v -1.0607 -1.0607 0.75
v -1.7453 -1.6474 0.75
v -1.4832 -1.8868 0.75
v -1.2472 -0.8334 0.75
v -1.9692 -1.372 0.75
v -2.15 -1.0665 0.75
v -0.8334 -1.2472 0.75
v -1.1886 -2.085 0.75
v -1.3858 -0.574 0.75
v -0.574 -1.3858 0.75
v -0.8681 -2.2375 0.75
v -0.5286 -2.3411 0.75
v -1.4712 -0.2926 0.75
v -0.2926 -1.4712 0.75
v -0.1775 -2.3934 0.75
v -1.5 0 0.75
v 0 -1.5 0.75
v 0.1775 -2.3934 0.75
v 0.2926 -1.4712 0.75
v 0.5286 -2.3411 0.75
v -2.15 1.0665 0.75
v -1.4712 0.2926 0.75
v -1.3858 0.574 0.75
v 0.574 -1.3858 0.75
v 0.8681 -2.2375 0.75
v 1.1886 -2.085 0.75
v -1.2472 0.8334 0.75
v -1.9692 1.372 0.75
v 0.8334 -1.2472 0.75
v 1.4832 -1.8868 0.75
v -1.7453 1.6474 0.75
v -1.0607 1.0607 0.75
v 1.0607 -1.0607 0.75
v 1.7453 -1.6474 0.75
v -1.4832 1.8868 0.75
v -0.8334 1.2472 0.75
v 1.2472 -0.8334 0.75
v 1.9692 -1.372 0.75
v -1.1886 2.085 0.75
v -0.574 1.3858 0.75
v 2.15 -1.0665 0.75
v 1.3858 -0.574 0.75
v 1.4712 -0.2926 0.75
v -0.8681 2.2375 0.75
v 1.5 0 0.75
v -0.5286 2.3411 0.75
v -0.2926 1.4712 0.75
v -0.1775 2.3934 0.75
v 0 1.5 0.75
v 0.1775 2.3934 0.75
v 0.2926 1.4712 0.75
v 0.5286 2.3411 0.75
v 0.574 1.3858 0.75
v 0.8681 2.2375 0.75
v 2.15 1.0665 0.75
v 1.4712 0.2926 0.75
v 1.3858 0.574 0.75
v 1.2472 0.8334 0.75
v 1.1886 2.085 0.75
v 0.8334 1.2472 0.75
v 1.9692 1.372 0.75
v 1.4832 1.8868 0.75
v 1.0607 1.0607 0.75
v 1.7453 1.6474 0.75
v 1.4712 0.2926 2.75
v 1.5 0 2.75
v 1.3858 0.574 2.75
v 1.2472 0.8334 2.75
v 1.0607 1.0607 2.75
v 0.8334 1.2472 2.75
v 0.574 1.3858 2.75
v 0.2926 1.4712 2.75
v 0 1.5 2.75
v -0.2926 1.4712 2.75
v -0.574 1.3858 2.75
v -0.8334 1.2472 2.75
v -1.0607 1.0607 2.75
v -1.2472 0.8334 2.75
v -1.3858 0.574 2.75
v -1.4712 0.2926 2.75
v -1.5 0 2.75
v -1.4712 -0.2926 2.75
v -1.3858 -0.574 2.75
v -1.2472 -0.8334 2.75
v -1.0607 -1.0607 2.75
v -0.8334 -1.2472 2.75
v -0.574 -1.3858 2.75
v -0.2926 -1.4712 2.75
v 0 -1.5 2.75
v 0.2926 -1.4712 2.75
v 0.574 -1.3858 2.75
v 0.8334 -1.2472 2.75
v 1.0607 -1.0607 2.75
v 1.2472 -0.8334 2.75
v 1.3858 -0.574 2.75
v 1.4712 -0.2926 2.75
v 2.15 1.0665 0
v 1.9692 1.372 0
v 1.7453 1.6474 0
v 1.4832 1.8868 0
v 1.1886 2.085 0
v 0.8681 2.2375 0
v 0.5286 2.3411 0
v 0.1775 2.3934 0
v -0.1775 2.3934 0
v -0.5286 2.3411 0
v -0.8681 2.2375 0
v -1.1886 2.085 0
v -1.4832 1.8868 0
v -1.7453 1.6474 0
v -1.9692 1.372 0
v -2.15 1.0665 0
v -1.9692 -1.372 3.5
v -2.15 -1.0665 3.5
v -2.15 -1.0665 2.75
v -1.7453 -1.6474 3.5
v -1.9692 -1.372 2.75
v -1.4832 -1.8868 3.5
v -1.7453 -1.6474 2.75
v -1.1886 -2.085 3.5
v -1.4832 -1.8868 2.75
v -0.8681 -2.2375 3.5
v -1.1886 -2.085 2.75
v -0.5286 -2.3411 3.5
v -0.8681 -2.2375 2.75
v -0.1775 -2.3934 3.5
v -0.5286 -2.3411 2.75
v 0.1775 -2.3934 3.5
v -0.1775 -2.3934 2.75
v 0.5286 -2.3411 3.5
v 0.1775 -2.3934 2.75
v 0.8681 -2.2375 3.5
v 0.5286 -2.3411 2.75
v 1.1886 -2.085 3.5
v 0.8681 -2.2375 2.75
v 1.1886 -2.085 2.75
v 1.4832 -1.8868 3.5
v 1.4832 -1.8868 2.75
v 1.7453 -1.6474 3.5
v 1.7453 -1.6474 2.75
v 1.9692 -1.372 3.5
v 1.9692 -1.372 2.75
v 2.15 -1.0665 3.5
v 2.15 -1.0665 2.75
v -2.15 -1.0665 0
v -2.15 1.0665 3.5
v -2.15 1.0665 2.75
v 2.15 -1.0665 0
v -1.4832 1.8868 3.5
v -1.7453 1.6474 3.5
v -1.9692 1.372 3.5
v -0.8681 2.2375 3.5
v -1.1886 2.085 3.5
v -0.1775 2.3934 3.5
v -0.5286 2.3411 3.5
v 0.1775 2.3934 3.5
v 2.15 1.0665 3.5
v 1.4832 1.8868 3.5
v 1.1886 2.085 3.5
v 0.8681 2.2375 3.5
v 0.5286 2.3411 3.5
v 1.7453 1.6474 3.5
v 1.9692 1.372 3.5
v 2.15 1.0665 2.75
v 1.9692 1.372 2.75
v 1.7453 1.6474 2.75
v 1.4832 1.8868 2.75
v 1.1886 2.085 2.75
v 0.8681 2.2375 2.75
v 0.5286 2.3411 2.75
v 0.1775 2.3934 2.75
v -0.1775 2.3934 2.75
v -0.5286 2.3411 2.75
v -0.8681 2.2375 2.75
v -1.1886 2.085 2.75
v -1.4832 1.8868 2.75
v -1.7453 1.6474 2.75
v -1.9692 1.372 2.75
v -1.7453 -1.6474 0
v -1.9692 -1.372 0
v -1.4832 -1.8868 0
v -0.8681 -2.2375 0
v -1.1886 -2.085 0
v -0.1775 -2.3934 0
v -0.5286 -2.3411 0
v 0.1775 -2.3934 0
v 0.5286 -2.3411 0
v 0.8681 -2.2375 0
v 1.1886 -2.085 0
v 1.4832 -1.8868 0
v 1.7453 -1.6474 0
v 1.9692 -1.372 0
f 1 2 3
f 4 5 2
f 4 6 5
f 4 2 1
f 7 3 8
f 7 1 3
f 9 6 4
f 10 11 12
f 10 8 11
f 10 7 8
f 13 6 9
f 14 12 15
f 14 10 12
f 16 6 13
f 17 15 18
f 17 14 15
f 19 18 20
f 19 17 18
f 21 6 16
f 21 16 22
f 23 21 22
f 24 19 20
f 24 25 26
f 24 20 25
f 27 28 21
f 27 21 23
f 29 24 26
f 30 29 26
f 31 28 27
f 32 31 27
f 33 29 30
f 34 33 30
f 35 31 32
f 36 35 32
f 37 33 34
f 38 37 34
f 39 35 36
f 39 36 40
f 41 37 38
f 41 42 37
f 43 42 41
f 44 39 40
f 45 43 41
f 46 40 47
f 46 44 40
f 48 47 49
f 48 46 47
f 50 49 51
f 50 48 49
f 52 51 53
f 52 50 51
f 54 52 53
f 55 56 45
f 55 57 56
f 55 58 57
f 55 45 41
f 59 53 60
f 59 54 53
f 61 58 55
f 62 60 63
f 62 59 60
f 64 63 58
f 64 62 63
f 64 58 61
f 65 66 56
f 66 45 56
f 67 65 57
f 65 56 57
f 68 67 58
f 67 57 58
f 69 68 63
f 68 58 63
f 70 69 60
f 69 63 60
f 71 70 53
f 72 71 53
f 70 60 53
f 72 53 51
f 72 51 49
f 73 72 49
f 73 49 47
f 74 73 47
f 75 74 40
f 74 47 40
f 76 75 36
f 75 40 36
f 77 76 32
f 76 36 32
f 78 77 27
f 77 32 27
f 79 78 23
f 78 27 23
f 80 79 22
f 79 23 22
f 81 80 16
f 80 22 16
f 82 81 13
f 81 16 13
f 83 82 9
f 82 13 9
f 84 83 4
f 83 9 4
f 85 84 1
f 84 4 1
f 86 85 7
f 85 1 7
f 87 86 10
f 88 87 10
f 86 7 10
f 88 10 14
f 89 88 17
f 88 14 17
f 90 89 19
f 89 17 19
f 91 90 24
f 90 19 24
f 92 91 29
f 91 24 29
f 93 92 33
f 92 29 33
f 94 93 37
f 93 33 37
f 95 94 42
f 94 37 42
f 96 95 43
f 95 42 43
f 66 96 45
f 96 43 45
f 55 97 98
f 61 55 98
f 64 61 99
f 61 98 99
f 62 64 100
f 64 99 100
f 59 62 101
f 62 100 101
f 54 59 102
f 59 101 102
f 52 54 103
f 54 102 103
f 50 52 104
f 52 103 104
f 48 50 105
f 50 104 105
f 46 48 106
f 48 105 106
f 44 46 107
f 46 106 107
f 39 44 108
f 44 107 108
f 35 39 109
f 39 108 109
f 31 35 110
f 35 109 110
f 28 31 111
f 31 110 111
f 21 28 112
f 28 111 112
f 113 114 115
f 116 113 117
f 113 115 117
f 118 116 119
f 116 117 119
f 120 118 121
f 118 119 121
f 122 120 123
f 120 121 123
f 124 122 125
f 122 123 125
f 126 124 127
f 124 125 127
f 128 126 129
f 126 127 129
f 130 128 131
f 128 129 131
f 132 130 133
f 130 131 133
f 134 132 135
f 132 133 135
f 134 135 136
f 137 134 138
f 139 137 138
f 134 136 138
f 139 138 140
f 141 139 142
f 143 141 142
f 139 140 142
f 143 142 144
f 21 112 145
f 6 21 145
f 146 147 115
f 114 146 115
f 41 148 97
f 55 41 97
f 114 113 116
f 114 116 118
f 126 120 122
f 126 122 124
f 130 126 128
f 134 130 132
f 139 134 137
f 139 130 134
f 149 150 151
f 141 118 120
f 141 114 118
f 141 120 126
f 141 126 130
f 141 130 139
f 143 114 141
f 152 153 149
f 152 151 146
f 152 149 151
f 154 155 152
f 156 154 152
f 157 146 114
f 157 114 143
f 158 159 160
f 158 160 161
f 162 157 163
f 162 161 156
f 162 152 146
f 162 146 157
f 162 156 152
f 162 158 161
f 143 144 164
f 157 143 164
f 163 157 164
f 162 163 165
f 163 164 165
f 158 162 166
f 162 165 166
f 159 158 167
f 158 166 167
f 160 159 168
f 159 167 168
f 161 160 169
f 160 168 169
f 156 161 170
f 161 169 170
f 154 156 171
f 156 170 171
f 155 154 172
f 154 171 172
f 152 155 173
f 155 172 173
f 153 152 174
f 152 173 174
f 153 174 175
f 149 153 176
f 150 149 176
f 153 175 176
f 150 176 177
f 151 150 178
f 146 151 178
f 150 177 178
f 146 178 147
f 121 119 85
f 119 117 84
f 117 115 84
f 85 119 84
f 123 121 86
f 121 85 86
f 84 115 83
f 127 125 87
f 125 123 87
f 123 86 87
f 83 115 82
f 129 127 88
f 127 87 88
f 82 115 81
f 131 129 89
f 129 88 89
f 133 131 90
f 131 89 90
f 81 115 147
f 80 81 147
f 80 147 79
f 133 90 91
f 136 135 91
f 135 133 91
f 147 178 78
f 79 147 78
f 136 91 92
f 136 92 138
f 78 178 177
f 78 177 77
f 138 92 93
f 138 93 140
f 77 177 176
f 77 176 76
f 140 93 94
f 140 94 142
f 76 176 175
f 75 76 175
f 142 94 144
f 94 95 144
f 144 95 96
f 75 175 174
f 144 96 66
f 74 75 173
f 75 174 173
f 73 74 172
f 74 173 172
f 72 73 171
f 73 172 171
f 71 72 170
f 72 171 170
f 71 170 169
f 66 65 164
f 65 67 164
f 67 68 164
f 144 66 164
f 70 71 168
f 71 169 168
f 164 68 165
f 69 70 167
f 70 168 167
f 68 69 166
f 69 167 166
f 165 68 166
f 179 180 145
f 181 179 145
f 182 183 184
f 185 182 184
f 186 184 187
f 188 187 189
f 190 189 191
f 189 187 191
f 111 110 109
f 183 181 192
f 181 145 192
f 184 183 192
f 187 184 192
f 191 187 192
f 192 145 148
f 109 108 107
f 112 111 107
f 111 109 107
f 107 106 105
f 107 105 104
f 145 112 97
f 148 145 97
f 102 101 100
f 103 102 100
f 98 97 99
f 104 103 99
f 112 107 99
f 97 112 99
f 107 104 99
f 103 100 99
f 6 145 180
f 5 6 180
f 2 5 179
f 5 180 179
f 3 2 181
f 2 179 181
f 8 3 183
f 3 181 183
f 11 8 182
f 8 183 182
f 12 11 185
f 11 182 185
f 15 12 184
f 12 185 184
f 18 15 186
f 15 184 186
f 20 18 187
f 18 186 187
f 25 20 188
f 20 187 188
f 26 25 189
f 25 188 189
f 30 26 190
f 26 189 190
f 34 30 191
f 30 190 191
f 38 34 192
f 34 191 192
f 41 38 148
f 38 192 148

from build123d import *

# Parameters (mm, degrees)
PAD_DEPTH     = 3.5
SKETCH001_R   = 2.75
SKETCH001_R_2 = 1.5
POCKET_DEPTH  = 1


with BuildPart() as part:
    # Sketch → Pad (new body)
    with BuildSketch(Plane.XY):
        with BuildLine():
            ThreePointArc((2.15, 1.066536), (0, 2.4), (-2.15, 1.066536))
            Line((-2.15, 1.066536), (-2.15, -1.066536))
            ThreePointArc((-2.15, -1.066536), (0, -2.4), (2.15, -1.066536))
            Line((2.15, -1.066536), (2.15, 1.066536))
        make_face()
    extrude(amount=PAD_DEPTH)

    # Sketch001 (on DatumPlane) → Pocket (cut, symmetric)
    with BuildSketch(Plane.XY.offset(1.75)):
        Circle(SKETCH001_R)
        Circle(SKETCH001_R_2, mode=Mode.SUBTRACT)
    extrude(amount=POCKET_DEPTH, both=True, mode=Mode.SUBTRACT)


solid = part.part
